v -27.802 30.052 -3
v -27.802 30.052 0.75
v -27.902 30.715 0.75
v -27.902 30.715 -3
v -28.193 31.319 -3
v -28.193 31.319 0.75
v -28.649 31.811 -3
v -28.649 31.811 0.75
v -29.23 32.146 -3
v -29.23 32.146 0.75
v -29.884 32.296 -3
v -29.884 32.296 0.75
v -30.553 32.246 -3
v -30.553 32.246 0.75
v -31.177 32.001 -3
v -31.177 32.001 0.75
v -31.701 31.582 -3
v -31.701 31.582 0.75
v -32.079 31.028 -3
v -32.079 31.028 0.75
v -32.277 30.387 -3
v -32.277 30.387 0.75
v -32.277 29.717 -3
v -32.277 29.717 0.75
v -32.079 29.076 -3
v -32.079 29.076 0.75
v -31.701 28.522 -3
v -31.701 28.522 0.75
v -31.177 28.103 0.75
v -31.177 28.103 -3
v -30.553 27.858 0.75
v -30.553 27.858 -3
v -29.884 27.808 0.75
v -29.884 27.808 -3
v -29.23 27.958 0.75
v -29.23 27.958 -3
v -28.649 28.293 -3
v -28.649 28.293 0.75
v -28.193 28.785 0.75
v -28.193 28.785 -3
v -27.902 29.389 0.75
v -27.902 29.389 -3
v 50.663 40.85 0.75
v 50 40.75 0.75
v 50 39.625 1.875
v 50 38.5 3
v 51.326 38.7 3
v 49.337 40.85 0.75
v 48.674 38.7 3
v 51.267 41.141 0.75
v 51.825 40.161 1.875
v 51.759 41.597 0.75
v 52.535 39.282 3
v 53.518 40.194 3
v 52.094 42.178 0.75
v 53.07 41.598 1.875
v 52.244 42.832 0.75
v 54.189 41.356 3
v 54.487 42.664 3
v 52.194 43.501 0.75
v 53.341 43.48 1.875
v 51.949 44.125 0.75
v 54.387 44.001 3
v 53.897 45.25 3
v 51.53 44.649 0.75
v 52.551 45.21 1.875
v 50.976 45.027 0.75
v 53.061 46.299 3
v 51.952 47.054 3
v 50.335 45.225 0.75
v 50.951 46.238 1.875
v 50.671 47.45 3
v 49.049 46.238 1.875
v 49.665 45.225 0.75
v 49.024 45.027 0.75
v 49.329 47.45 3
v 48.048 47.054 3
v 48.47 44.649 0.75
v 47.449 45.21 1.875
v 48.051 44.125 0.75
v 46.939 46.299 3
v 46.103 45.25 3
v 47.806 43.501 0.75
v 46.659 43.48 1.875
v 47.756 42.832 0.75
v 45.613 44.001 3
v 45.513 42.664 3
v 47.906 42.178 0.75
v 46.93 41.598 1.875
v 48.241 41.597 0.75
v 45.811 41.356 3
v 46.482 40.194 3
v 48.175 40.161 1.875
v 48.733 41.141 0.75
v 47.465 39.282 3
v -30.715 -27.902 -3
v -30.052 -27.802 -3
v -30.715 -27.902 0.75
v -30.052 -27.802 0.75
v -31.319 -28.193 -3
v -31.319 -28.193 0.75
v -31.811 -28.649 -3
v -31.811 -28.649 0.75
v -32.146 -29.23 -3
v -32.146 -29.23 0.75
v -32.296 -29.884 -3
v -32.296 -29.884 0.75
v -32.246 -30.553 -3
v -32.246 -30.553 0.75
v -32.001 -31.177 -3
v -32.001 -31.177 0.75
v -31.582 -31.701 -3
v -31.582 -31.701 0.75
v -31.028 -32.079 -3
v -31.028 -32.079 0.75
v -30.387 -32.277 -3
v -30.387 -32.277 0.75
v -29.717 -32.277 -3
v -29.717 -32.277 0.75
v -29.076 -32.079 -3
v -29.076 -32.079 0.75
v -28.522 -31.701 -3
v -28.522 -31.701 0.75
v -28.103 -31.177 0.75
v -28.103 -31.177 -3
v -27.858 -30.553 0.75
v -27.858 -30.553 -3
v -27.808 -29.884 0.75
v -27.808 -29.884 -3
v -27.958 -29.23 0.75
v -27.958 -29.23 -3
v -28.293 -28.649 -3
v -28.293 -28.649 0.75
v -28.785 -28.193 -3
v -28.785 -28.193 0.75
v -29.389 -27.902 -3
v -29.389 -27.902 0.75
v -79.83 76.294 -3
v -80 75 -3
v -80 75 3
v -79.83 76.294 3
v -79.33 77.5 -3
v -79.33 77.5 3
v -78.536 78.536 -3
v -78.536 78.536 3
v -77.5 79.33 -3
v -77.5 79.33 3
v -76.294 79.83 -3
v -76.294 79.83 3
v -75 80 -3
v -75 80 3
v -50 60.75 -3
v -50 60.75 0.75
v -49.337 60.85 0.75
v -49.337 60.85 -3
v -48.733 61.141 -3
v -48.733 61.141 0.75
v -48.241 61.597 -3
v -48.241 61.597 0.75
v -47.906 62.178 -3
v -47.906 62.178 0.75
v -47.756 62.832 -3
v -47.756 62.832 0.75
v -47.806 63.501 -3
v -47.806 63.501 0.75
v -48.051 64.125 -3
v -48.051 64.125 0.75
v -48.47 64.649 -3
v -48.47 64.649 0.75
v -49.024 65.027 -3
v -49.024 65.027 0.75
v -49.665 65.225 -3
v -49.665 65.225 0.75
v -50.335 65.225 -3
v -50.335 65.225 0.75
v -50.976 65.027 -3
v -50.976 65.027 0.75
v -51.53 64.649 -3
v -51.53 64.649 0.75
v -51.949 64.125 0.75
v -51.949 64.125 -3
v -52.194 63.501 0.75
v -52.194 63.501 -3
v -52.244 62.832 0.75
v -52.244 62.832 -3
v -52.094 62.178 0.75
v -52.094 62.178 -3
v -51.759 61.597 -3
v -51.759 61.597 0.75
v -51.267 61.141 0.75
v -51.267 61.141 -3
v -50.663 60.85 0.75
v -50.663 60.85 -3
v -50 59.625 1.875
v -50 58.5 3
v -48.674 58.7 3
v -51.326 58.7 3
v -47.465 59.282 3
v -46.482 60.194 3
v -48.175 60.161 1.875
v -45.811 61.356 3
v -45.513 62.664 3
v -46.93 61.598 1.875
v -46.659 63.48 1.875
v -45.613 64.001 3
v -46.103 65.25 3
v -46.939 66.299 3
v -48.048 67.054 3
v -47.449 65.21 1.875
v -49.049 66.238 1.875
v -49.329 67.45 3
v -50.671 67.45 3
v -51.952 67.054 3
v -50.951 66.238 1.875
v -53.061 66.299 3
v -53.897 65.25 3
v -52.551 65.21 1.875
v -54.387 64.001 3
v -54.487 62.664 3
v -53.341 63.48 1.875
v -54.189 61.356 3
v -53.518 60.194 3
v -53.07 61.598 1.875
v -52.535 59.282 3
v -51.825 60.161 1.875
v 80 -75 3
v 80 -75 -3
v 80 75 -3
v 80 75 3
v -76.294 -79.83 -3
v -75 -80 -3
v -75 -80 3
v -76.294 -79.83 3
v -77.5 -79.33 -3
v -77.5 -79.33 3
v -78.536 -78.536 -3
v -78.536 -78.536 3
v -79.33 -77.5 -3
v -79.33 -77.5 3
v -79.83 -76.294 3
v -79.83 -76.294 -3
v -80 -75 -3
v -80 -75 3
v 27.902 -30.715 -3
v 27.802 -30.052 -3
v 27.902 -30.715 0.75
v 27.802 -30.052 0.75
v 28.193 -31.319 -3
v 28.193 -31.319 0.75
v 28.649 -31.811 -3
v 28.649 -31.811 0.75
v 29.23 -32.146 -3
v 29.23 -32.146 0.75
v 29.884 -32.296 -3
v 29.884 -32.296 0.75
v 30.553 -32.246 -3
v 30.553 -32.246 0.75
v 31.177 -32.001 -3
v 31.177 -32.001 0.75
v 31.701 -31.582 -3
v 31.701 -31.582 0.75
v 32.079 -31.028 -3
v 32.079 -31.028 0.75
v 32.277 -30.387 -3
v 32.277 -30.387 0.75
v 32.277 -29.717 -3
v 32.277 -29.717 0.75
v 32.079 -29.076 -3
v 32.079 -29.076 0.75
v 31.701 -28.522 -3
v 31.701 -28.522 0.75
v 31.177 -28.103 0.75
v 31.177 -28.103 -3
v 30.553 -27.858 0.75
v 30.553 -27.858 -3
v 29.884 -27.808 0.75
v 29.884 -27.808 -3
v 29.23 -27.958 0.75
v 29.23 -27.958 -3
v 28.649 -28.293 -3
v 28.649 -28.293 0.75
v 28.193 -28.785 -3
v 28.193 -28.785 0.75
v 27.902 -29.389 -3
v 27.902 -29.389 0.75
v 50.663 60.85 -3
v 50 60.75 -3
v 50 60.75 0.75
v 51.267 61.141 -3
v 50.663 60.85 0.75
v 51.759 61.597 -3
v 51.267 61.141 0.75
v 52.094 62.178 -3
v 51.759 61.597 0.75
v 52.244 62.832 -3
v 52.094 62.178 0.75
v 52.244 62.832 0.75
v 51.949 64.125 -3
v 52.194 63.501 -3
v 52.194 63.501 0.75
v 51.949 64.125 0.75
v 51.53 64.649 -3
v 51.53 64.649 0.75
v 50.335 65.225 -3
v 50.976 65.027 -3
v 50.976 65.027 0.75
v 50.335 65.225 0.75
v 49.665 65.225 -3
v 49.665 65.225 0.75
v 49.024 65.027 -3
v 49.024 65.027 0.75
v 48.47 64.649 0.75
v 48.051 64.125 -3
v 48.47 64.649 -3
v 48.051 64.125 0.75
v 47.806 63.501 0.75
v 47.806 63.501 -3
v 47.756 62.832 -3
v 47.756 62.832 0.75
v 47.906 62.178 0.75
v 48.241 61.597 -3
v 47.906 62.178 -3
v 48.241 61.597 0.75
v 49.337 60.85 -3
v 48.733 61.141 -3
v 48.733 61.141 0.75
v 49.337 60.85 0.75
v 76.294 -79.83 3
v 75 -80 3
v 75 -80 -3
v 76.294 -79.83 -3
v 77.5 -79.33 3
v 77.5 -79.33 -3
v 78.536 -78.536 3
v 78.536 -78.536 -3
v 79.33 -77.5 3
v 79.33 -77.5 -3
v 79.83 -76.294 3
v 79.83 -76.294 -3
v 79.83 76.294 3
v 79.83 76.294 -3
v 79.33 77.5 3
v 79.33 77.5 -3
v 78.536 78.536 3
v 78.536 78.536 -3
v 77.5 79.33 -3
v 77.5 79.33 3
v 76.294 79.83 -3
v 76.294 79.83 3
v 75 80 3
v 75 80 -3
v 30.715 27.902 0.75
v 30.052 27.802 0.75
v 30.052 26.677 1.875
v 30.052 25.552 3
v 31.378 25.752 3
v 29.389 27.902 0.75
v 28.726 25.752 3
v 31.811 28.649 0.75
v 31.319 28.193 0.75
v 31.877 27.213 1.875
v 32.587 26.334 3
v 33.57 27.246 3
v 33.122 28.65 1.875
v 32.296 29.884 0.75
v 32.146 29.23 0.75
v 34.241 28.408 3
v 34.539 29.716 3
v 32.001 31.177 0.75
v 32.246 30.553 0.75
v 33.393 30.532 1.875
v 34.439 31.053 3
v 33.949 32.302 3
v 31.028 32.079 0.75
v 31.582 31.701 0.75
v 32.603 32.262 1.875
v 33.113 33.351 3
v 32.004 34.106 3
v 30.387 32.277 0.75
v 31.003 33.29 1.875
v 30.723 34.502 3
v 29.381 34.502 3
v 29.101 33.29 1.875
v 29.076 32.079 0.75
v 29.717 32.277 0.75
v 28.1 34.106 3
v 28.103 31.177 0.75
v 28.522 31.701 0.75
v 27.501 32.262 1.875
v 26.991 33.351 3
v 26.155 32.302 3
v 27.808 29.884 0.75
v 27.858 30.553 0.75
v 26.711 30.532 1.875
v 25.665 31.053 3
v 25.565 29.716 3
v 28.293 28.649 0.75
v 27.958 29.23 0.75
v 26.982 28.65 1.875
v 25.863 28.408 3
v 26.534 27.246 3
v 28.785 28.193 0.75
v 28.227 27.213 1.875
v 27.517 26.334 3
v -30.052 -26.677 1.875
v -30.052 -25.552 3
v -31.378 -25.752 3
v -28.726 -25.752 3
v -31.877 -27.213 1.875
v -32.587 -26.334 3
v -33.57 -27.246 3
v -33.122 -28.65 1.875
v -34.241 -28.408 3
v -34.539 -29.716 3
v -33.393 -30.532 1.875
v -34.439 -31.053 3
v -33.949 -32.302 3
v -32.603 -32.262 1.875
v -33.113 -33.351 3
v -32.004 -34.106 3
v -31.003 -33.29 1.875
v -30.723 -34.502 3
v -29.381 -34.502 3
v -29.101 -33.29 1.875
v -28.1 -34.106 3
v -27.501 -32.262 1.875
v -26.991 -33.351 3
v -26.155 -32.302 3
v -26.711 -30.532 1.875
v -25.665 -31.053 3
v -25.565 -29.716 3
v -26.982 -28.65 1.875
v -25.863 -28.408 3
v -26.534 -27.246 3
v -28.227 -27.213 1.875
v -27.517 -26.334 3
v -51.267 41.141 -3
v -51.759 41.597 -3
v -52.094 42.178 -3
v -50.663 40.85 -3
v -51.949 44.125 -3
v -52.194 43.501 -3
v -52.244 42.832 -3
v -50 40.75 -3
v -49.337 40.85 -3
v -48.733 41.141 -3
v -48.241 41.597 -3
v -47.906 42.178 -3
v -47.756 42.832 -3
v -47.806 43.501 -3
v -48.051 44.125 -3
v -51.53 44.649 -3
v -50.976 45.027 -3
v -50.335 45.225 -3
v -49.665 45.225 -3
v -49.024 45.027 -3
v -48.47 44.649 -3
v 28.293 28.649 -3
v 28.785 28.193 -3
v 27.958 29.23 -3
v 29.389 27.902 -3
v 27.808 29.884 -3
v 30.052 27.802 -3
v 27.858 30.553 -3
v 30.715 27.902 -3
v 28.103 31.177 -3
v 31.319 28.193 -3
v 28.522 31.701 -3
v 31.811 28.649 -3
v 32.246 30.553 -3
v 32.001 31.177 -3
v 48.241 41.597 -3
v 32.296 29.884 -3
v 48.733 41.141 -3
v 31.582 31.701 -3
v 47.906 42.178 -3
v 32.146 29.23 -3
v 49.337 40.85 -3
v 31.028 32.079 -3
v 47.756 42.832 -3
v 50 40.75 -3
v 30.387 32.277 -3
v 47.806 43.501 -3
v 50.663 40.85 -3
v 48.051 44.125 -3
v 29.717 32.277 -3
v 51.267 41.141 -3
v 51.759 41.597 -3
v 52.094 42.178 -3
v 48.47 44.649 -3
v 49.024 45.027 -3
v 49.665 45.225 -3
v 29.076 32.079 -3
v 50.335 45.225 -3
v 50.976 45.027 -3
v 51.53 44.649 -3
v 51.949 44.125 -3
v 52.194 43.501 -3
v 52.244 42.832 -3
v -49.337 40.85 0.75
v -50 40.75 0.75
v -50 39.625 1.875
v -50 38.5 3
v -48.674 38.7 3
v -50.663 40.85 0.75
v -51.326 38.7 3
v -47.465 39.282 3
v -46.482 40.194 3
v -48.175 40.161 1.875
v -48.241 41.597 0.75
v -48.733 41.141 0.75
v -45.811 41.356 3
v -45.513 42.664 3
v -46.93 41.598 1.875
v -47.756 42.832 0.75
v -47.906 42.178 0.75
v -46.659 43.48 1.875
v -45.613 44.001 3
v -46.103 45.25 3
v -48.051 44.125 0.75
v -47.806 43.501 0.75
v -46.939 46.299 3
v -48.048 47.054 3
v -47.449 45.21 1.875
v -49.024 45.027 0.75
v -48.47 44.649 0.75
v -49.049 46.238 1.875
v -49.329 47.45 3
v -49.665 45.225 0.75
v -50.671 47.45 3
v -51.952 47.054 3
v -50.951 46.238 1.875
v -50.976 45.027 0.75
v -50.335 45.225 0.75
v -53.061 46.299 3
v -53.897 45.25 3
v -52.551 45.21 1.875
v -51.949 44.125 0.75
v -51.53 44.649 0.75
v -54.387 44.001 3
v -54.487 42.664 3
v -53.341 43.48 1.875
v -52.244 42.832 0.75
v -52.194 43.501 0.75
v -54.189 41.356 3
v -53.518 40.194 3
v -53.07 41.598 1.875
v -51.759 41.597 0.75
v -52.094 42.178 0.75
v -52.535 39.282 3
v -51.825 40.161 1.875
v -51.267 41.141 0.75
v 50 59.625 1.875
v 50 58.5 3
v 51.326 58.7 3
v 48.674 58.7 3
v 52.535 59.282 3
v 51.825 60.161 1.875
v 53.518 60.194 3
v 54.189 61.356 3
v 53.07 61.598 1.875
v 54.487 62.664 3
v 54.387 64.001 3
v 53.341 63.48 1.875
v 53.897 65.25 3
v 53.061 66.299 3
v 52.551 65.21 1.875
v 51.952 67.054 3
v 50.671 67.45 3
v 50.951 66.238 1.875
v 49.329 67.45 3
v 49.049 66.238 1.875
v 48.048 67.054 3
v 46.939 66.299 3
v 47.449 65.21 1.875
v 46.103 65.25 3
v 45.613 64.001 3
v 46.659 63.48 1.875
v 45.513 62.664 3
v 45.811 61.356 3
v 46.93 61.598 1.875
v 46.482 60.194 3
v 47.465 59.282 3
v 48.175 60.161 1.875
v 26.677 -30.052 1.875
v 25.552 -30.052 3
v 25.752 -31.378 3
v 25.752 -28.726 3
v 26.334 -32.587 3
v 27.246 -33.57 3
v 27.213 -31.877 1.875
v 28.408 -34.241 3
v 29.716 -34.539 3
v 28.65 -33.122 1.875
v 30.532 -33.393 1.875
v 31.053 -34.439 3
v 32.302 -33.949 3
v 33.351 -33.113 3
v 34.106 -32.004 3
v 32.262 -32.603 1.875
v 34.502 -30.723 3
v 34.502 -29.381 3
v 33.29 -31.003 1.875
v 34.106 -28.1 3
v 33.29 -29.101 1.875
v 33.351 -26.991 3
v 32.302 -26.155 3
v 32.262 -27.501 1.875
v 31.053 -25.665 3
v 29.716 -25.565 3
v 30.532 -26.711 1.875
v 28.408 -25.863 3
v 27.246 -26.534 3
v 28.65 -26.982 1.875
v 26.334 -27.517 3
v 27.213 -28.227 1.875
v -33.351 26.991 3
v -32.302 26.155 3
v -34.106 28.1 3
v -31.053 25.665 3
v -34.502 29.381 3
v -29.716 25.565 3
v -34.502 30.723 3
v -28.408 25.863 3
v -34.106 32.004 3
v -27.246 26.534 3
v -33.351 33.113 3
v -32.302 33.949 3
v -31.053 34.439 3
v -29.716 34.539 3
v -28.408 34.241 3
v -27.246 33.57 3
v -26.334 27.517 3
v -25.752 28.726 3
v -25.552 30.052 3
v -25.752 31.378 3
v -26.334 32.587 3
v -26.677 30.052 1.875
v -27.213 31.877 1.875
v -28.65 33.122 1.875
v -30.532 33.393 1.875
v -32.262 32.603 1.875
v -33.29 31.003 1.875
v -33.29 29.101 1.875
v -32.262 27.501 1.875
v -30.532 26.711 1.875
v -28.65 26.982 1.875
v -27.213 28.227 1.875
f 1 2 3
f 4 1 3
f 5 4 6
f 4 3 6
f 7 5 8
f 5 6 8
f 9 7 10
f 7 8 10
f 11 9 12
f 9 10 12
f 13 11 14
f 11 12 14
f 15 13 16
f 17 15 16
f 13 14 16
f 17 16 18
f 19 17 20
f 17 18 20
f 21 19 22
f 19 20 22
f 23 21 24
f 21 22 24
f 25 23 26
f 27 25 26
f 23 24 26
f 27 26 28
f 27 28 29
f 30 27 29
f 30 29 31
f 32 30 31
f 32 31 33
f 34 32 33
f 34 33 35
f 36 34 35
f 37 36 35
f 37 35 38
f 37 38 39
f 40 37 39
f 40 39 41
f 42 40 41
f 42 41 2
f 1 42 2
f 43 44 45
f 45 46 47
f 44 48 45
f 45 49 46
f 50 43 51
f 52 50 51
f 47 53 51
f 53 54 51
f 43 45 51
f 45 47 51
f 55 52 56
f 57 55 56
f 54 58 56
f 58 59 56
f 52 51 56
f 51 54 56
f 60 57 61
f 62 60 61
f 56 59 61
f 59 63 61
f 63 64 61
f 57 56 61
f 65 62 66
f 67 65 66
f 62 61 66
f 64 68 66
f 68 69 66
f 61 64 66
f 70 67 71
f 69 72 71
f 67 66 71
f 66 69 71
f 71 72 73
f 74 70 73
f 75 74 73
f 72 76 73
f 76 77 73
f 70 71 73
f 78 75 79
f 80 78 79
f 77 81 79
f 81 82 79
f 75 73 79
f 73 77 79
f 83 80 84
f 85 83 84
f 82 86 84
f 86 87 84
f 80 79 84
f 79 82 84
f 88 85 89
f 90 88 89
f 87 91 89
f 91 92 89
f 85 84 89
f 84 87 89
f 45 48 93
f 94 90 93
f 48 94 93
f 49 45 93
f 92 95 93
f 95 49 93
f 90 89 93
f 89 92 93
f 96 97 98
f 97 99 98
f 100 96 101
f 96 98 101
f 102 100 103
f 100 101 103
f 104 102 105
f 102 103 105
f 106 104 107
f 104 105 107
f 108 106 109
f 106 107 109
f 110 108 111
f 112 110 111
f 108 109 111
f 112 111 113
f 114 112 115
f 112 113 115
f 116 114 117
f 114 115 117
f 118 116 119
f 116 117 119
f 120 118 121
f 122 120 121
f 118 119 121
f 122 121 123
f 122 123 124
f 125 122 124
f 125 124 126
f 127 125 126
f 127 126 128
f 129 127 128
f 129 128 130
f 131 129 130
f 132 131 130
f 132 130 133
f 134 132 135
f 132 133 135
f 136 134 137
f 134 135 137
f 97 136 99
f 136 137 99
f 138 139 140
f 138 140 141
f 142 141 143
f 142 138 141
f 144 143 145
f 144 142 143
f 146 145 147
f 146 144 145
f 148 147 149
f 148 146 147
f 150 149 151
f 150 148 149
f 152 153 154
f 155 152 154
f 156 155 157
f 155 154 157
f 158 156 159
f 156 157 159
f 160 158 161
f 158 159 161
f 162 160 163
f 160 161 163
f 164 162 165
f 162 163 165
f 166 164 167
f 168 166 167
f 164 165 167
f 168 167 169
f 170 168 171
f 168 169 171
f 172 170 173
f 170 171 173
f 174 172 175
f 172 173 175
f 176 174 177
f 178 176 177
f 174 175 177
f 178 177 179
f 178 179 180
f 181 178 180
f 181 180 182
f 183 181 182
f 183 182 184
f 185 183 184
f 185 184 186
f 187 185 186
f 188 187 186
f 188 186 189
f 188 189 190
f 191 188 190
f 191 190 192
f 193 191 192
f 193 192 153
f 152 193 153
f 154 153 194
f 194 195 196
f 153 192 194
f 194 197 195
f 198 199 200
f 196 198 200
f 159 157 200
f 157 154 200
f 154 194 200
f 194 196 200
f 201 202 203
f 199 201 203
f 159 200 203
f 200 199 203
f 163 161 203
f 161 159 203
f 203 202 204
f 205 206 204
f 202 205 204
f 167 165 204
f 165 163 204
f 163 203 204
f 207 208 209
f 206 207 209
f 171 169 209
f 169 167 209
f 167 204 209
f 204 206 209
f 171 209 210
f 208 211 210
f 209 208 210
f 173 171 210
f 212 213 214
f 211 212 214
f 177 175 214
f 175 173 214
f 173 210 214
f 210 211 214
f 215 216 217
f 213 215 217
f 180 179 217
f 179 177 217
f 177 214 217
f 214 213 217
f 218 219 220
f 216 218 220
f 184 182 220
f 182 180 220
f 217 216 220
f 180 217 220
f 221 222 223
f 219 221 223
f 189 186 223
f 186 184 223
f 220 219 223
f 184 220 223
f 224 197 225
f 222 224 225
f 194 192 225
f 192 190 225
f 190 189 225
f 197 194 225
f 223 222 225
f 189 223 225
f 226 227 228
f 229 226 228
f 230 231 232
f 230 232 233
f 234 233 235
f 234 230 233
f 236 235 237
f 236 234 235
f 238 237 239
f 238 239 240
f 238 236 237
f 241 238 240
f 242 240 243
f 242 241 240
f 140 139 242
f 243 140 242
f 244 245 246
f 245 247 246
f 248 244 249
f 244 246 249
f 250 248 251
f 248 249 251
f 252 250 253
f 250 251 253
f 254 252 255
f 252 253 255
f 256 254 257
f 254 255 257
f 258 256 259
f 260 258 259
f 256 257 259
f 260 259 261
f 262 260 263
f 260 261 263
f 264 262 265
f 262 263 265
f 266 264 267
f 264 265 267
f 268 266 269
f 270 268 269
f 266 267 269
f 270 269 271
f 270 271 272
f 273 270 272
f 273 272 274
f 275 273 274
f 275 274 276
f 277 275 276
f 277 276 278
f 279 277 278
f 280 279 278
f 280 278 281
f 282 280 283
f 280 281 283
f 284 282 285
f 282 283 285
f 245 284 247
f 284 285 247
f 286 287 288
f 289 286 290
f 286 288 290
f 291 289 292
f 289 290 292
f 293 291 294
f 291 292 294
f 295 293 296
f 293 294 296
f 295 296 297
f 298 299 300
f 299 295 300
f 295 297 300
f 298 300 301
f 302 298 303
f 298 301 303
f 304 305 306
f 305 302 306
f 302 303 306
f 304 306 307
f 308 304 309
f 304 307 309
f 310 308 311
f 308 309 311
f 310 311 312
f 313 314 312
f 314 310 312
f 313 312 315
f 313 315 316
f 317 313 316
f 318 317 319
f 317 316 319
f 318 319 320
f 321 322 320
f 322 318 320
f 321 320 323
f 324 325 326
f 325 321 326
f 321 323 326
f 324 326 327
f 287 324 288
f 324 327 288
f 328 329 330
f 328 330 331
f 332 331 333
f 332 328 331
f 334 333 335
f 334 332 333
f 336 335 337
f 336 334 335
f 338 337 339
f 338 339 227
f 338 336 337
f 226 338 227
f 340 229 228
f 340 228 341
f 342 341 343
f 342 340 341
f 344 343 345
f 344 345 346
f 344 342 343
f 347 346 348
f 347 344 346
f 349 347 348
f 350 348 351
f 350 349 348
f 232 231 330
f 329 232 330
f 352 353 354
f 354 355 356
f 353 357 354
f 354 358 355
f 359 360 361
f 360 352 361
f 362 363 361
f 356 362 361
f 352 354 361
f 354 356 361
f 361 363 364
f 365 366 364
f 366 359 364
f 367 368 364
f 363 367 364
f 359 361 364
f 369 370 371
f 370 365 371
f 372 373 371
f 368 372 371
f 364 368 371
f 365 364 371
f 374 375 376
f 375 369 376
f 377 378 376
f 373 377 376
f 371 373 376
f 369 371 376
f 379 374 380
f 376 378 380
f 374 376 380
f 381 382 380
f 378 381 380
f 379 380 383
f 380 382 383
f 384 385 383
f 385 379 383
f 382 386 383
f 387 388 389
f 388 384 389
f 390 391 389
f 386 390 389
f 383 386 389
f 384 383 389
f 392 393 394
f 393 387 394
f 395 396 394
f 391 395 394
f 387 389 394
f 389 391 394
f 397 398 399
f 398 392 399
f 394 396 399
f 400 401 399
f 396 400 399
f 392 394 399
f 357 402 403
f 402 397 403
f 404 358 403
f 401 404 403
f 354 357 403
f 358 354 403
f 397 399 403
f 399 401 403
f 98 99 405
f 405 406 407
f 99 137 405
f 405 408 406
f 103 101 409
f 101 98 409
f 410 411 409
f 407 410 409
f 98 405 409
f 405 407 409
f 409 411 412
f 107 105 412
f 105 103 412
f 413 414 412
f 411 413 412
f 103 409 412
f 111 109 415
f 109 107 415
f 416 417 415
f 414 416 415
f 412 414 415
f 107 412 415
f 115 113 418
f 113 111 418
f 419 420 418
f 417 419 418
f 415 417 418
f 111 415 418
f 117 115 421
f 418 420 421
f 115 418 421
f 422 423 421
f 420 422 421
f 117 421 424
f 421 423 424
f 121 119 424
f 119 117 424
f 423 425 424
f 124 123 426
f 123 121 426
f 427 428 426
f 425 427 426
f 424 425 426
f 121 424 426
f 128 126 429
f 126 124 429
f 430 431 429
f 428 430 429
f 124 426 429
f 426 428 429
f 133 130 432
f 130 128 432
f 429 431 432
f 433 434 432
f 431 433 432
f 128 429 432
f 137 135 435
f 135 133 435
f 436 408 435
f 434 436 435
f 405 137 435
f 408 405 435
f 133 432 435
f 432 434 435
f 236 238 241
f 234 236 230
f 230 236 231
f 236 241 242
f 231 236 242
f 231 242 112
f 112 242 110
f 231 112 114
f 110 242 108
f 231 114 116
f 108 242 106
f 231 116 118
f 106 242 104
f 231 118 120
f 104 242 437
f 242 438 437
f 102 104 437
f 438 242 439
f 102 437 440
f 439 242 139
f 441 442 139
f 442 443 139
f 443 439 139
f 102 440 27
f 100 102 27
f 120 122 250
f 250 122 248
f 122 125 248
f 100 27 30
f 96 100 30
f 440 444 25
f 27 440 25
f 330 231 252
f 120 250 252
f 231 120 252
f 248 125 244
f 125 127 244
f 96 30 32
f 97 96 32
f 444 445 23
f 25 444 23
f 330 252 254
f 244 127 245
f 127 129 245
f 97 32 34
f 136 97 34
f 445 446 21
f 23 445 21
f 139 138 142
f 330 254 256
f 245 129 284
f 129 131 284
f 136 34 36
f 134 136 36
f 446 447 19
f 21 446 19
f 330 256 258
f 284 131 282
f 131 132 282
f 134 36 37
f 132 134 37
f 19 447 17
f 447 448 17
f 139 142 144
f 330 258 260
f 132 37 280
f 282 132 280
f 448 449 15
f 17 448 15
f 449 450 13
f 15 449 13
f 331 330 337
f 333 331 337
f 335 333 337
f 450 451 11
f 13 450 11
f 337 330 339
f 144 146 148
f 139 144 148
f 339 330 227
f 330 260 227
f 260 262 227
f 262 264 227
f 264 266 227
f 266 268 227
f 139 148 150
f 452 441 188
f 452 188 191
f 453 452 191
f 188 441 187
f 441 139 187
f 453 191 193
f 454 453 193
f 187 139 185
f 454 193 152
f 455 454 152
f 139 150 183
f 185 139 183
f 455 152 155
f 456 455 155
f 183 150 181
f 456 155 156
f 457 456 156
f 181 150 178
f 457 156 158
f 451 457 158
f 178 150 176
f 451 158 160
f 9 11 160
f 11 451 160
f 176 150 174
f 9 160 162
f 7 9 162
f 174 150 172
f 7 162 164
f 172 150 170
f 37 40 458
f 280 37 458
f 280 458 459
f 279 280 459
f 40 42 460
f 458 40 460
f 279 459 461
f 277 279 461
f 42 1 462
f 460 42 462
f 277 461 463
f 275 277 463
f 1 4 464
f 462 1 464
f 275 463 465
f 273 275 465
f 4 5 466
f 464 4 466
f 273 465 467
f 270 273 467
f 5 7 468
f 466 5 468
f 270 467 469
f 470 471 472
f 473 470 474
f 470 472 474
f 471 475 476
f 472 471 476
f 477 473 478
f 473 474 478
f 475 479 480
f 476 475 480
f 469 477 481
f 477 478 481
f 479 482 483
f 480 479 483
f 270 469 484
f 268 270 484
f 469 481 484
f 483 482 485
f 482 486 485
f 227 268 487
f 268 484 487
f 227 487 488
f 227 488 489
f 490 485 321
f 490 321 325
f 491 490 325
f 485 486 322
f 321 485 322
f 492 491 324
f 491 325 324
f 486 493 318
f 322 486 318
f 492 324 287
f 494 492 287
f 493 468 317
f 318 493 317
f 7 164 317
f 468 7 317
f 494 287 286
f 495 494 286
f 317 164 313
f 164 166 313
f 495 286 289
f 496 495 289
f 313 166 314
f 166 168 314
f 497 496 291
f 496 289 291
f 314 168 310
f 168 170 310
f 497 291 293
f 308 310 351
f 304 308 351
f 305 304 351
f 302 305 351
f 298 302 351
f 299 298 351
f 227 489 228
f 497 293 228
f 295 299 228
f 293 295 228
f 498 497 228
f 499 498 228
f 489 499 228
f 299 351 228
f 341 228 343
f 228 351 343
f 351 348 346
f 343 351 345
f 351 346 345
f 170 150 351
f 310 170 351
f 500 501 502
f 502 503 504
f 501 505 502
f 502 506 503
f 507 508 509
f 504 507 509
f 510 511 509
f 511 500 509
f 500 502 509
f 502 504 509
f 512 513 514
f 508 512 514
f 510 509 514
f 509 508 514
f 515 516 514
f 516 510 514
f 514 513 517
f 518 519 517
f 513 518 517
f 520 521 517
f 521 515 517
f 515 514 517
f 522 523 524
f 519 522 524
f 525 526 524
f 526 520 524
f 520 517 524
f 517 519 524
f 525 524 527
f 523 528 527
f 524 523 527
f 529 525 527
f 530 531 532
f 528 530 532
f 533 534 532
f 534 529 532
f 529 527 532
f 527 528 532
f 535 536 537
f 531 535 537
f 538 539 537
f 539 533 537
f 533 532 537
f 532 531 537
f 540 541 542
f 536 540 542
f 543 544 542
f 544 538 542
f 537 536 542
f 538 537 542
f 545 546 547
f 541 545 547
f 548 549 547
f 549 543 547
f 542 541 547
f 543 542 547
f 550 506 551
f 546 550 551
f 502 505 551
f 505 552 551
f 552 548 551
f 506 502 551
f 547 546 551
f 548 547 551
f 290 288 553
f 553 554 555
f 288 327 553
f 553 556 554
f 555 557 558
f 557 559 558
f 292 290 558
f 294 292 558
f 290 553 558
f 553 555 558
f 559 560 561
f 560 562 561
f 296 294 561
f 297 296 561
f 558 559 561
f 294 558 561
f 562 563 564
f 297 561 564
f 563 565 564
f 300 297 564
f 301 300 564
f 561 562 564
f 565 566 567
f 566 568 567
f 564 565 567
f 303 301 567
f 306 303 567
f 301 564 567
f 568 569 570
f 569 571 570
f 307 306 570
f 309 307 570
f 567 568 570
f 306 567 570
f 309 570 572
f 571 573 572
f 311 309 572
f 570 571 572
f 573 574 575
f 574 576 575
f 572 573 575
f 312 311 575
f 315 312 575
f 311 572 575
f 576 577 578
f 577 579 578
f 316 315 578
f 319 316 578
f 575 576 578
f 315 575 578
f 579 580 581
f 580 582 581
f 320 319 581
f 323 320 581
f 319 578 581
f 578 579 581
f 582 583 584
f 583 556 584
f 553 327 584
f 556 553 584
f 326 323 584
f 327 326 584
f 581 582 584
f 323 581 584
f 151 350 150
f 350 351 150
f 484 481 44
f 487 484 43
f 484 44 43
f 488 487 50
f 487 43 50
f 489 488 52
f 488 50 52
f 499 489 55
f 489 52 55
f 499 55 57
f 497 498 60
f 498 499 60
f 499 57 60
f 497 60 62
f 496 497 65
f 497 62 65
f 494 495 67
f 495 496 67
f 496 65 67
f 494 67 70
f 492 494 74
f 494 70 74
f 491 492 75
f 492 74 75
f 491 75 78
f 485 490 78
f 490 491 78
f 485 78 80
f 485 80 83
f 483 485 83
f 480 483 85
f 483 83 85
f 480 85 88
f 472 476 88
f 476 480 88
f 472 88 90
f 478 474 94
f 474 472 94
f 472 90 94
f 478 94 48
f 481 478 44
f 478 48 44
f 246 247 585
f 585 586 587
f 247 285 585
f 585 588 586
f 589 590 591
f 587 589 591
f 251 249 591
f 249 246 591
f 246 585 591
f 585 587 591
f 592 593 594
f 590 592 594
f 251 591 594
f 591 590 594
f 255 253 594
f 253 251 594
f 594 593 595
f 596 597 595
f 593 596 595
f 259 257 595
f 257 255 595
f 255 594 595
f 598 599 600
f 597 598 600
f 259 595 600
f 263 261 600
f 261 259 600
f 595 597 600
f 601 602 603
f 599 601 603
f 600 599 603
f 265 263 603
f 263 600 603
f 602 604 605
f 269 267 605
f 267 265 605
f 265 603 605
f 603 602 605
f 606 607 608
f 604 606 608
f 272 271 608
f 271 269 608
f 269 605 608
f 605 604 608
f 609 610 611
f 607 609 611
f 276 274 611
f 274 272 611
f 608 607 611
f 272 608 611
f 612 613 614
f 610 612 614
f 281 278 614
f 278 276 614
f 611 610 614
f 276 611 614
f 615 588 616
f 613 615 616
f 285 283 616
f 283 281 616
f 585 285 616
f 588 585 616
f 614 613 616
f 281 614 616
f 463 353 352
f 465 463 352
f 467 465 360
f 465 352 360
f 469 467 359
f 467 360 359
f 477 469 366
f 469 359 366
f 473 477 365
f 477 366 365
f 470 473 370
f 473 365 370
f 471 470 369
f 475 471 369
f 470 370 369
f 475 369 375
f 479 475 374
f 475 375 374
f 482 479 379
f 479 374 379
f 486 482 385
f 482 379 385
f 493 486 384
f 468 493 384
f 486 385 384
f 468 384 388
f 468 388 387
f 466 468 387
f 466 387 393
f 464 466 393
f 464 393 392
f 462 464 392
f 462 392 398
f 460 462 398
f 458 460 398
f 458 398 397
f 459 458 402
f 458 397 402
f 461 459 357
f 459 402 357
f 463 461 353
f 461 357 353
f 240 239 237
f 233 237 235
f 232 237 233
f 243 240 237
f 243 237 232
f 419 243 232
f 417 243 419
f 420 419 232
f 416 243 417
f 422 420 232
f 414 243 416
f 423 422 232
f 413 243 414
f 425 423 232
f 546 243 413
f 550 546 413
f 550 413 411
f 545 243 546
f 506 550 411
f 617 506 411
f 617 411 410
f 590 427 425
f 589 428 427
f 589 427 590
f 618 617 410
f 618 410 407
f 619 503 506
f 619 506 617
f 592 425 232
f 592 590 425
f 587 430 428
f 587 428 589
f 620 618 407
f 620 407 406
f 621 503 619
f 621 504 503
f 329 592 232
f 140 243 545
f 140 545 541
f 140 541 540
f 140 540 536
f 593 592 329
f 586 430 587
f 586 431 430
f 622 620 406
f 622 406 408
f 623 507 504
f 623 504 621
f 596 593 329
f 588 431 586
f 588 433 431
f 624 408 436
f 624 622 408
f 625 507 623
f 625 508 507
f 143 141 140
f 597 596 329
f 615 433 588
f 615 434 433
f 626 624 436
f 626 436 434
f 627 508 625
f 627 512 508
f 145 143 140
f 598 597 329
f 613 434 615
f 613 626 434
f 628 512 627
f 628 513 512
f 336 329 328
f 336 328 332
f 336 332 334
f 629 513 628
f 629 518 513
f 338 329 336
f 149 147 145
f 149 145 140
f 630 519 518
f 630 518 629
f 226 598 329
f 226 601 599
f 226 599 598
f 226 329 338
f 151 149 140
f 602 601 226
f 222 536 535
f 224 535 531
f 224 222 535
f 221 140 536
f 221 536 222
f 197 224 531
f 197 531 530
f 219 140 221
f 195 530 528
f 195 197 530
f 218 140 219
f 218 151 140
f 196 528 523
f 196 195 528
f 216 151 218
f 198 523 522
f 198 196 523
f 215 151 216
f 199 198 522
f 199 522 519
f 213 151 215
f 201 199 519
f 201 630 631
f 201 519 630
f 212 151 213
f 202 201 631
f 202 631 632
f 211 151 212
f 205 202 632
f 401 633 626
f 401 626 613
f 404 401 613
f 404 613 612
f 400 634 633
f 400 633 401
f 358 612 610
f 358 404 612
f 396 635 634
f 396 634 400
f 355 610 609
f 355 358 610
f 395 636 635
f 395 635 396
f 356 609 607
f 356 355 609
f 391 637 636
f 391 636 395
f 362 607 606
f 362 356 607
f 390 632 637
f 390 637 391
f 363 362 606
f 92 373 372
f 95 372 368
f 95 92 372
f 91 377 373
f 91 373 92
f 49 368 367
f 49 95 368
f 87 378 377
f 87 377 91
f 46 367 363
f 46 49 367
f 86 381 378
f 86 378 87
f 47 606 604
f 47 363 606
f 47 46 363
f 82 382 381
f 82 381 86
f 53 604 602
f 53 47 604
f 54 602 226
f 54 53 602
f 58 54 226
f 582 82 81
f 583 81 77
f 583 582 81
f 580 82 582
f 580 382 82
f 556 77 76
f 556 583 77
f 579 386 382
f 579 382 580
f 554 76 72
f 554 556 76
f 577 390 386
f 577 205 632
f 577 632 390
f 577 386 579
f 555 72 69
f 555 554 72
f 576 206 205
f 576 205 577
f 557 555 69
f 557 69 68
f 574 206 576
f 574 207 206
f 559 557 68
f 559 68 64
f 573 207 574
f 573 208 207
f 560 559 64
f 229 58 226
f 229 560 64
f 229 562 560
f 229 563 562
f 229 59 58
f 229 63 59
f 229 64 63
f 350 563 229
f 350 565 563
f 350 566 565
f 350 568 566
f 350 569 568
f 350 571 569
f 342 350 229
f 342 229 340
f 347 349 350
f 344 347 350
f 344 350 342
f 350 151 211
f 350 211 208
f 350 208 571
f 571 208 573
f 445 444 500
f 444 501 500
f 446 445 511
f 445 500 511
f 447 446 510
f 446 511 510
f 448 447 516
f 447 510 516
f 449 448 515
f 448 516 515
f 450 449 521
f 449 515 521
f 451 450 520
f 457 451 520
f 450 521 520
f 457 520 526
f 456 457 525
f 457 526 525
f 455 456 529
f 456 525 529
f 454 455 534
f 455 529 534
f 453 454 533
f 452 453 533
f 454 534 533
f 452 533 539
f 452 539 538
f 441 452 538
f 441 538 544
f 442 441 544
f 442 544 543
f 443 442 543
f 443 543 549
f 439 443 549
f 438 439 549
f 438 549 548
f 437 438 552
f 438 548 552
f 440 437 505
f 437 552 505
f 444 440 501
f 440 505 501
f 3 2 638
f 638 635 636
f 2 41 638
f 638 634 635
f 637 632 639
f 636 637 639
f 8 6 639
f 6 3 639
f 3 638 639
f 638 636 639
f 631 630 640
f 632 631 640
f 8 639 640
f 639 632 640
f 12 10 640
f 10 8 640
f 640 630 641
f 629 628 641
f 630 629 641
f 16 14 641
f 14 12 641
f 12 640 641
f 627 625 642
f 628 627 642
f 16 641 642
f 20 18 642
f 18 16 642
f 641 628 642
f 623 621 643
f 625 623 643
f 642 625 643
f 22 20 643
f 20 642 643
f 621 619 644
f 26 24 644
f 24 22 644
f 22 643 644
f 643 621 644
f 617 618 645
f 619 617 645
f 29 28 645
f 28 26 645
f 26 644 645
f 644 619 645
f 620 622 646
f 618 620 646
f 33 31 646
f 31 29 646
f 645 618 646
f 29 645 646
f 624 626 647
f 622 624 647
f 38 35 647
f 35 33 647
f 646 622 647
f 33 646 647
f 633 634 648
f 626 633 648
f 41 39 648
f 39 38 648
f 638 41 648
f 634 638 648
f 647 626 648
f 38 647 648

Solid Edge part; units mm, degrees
sketch "Sketch1" plane through (60.3162, 60.3162, 0) normal (0, 0, 1) x (1, 0, 0)
  line L0 (-140.3162, -140.3162) -> (19.6838, -140.3162)
  line L1 (19.6838, -140.3162) -> (19.6838, 19.6838)
  line L2 (19.6838, 19.6838) -> (-140.3162, 19.6838)
  line L3 (-140.3162, 19.6838) -> (-140.3162, -140.3162)
  dimension "D1" = 160
  dimension "D2" = 160
extrude "Protrusion1" add sketch "Sketch1" along normal mid plane 6
fillet "Verrundung_1" radius 5 4 edges at (-80, 80, 0) (80, 80, 0) (80, -80, 0) (-80, -80, 0)
hole "Bohrung_1" at (30.052, 30.052, 3) direction (0, 0, -1) diameter 4.5 end up to next countersink diameter 9 countersink angle 90
pattern_circular "Pattern1" count 4 over 360 about axis through (0, 0, 3) along (0, 0, 1) of "Bohrung_1"
hole "Bohrung_2" at (-50, 63, 3) direction (0, 0, -1) diameter 4.5 end up to next countersink diameter 9 countersink angle 90
hole "Hole1" at (-50, 43, 3) direction (0, 0, -1) diameter 4.5 end up to next countersink diameter 9 countersink angle 90
mirror "Mirror1" about plane through (0, 5.5244, 5.5244) normal (1, 0, 0) of "Bohrung_2", "Hole1"
properties material "Aluminium, 1060"
